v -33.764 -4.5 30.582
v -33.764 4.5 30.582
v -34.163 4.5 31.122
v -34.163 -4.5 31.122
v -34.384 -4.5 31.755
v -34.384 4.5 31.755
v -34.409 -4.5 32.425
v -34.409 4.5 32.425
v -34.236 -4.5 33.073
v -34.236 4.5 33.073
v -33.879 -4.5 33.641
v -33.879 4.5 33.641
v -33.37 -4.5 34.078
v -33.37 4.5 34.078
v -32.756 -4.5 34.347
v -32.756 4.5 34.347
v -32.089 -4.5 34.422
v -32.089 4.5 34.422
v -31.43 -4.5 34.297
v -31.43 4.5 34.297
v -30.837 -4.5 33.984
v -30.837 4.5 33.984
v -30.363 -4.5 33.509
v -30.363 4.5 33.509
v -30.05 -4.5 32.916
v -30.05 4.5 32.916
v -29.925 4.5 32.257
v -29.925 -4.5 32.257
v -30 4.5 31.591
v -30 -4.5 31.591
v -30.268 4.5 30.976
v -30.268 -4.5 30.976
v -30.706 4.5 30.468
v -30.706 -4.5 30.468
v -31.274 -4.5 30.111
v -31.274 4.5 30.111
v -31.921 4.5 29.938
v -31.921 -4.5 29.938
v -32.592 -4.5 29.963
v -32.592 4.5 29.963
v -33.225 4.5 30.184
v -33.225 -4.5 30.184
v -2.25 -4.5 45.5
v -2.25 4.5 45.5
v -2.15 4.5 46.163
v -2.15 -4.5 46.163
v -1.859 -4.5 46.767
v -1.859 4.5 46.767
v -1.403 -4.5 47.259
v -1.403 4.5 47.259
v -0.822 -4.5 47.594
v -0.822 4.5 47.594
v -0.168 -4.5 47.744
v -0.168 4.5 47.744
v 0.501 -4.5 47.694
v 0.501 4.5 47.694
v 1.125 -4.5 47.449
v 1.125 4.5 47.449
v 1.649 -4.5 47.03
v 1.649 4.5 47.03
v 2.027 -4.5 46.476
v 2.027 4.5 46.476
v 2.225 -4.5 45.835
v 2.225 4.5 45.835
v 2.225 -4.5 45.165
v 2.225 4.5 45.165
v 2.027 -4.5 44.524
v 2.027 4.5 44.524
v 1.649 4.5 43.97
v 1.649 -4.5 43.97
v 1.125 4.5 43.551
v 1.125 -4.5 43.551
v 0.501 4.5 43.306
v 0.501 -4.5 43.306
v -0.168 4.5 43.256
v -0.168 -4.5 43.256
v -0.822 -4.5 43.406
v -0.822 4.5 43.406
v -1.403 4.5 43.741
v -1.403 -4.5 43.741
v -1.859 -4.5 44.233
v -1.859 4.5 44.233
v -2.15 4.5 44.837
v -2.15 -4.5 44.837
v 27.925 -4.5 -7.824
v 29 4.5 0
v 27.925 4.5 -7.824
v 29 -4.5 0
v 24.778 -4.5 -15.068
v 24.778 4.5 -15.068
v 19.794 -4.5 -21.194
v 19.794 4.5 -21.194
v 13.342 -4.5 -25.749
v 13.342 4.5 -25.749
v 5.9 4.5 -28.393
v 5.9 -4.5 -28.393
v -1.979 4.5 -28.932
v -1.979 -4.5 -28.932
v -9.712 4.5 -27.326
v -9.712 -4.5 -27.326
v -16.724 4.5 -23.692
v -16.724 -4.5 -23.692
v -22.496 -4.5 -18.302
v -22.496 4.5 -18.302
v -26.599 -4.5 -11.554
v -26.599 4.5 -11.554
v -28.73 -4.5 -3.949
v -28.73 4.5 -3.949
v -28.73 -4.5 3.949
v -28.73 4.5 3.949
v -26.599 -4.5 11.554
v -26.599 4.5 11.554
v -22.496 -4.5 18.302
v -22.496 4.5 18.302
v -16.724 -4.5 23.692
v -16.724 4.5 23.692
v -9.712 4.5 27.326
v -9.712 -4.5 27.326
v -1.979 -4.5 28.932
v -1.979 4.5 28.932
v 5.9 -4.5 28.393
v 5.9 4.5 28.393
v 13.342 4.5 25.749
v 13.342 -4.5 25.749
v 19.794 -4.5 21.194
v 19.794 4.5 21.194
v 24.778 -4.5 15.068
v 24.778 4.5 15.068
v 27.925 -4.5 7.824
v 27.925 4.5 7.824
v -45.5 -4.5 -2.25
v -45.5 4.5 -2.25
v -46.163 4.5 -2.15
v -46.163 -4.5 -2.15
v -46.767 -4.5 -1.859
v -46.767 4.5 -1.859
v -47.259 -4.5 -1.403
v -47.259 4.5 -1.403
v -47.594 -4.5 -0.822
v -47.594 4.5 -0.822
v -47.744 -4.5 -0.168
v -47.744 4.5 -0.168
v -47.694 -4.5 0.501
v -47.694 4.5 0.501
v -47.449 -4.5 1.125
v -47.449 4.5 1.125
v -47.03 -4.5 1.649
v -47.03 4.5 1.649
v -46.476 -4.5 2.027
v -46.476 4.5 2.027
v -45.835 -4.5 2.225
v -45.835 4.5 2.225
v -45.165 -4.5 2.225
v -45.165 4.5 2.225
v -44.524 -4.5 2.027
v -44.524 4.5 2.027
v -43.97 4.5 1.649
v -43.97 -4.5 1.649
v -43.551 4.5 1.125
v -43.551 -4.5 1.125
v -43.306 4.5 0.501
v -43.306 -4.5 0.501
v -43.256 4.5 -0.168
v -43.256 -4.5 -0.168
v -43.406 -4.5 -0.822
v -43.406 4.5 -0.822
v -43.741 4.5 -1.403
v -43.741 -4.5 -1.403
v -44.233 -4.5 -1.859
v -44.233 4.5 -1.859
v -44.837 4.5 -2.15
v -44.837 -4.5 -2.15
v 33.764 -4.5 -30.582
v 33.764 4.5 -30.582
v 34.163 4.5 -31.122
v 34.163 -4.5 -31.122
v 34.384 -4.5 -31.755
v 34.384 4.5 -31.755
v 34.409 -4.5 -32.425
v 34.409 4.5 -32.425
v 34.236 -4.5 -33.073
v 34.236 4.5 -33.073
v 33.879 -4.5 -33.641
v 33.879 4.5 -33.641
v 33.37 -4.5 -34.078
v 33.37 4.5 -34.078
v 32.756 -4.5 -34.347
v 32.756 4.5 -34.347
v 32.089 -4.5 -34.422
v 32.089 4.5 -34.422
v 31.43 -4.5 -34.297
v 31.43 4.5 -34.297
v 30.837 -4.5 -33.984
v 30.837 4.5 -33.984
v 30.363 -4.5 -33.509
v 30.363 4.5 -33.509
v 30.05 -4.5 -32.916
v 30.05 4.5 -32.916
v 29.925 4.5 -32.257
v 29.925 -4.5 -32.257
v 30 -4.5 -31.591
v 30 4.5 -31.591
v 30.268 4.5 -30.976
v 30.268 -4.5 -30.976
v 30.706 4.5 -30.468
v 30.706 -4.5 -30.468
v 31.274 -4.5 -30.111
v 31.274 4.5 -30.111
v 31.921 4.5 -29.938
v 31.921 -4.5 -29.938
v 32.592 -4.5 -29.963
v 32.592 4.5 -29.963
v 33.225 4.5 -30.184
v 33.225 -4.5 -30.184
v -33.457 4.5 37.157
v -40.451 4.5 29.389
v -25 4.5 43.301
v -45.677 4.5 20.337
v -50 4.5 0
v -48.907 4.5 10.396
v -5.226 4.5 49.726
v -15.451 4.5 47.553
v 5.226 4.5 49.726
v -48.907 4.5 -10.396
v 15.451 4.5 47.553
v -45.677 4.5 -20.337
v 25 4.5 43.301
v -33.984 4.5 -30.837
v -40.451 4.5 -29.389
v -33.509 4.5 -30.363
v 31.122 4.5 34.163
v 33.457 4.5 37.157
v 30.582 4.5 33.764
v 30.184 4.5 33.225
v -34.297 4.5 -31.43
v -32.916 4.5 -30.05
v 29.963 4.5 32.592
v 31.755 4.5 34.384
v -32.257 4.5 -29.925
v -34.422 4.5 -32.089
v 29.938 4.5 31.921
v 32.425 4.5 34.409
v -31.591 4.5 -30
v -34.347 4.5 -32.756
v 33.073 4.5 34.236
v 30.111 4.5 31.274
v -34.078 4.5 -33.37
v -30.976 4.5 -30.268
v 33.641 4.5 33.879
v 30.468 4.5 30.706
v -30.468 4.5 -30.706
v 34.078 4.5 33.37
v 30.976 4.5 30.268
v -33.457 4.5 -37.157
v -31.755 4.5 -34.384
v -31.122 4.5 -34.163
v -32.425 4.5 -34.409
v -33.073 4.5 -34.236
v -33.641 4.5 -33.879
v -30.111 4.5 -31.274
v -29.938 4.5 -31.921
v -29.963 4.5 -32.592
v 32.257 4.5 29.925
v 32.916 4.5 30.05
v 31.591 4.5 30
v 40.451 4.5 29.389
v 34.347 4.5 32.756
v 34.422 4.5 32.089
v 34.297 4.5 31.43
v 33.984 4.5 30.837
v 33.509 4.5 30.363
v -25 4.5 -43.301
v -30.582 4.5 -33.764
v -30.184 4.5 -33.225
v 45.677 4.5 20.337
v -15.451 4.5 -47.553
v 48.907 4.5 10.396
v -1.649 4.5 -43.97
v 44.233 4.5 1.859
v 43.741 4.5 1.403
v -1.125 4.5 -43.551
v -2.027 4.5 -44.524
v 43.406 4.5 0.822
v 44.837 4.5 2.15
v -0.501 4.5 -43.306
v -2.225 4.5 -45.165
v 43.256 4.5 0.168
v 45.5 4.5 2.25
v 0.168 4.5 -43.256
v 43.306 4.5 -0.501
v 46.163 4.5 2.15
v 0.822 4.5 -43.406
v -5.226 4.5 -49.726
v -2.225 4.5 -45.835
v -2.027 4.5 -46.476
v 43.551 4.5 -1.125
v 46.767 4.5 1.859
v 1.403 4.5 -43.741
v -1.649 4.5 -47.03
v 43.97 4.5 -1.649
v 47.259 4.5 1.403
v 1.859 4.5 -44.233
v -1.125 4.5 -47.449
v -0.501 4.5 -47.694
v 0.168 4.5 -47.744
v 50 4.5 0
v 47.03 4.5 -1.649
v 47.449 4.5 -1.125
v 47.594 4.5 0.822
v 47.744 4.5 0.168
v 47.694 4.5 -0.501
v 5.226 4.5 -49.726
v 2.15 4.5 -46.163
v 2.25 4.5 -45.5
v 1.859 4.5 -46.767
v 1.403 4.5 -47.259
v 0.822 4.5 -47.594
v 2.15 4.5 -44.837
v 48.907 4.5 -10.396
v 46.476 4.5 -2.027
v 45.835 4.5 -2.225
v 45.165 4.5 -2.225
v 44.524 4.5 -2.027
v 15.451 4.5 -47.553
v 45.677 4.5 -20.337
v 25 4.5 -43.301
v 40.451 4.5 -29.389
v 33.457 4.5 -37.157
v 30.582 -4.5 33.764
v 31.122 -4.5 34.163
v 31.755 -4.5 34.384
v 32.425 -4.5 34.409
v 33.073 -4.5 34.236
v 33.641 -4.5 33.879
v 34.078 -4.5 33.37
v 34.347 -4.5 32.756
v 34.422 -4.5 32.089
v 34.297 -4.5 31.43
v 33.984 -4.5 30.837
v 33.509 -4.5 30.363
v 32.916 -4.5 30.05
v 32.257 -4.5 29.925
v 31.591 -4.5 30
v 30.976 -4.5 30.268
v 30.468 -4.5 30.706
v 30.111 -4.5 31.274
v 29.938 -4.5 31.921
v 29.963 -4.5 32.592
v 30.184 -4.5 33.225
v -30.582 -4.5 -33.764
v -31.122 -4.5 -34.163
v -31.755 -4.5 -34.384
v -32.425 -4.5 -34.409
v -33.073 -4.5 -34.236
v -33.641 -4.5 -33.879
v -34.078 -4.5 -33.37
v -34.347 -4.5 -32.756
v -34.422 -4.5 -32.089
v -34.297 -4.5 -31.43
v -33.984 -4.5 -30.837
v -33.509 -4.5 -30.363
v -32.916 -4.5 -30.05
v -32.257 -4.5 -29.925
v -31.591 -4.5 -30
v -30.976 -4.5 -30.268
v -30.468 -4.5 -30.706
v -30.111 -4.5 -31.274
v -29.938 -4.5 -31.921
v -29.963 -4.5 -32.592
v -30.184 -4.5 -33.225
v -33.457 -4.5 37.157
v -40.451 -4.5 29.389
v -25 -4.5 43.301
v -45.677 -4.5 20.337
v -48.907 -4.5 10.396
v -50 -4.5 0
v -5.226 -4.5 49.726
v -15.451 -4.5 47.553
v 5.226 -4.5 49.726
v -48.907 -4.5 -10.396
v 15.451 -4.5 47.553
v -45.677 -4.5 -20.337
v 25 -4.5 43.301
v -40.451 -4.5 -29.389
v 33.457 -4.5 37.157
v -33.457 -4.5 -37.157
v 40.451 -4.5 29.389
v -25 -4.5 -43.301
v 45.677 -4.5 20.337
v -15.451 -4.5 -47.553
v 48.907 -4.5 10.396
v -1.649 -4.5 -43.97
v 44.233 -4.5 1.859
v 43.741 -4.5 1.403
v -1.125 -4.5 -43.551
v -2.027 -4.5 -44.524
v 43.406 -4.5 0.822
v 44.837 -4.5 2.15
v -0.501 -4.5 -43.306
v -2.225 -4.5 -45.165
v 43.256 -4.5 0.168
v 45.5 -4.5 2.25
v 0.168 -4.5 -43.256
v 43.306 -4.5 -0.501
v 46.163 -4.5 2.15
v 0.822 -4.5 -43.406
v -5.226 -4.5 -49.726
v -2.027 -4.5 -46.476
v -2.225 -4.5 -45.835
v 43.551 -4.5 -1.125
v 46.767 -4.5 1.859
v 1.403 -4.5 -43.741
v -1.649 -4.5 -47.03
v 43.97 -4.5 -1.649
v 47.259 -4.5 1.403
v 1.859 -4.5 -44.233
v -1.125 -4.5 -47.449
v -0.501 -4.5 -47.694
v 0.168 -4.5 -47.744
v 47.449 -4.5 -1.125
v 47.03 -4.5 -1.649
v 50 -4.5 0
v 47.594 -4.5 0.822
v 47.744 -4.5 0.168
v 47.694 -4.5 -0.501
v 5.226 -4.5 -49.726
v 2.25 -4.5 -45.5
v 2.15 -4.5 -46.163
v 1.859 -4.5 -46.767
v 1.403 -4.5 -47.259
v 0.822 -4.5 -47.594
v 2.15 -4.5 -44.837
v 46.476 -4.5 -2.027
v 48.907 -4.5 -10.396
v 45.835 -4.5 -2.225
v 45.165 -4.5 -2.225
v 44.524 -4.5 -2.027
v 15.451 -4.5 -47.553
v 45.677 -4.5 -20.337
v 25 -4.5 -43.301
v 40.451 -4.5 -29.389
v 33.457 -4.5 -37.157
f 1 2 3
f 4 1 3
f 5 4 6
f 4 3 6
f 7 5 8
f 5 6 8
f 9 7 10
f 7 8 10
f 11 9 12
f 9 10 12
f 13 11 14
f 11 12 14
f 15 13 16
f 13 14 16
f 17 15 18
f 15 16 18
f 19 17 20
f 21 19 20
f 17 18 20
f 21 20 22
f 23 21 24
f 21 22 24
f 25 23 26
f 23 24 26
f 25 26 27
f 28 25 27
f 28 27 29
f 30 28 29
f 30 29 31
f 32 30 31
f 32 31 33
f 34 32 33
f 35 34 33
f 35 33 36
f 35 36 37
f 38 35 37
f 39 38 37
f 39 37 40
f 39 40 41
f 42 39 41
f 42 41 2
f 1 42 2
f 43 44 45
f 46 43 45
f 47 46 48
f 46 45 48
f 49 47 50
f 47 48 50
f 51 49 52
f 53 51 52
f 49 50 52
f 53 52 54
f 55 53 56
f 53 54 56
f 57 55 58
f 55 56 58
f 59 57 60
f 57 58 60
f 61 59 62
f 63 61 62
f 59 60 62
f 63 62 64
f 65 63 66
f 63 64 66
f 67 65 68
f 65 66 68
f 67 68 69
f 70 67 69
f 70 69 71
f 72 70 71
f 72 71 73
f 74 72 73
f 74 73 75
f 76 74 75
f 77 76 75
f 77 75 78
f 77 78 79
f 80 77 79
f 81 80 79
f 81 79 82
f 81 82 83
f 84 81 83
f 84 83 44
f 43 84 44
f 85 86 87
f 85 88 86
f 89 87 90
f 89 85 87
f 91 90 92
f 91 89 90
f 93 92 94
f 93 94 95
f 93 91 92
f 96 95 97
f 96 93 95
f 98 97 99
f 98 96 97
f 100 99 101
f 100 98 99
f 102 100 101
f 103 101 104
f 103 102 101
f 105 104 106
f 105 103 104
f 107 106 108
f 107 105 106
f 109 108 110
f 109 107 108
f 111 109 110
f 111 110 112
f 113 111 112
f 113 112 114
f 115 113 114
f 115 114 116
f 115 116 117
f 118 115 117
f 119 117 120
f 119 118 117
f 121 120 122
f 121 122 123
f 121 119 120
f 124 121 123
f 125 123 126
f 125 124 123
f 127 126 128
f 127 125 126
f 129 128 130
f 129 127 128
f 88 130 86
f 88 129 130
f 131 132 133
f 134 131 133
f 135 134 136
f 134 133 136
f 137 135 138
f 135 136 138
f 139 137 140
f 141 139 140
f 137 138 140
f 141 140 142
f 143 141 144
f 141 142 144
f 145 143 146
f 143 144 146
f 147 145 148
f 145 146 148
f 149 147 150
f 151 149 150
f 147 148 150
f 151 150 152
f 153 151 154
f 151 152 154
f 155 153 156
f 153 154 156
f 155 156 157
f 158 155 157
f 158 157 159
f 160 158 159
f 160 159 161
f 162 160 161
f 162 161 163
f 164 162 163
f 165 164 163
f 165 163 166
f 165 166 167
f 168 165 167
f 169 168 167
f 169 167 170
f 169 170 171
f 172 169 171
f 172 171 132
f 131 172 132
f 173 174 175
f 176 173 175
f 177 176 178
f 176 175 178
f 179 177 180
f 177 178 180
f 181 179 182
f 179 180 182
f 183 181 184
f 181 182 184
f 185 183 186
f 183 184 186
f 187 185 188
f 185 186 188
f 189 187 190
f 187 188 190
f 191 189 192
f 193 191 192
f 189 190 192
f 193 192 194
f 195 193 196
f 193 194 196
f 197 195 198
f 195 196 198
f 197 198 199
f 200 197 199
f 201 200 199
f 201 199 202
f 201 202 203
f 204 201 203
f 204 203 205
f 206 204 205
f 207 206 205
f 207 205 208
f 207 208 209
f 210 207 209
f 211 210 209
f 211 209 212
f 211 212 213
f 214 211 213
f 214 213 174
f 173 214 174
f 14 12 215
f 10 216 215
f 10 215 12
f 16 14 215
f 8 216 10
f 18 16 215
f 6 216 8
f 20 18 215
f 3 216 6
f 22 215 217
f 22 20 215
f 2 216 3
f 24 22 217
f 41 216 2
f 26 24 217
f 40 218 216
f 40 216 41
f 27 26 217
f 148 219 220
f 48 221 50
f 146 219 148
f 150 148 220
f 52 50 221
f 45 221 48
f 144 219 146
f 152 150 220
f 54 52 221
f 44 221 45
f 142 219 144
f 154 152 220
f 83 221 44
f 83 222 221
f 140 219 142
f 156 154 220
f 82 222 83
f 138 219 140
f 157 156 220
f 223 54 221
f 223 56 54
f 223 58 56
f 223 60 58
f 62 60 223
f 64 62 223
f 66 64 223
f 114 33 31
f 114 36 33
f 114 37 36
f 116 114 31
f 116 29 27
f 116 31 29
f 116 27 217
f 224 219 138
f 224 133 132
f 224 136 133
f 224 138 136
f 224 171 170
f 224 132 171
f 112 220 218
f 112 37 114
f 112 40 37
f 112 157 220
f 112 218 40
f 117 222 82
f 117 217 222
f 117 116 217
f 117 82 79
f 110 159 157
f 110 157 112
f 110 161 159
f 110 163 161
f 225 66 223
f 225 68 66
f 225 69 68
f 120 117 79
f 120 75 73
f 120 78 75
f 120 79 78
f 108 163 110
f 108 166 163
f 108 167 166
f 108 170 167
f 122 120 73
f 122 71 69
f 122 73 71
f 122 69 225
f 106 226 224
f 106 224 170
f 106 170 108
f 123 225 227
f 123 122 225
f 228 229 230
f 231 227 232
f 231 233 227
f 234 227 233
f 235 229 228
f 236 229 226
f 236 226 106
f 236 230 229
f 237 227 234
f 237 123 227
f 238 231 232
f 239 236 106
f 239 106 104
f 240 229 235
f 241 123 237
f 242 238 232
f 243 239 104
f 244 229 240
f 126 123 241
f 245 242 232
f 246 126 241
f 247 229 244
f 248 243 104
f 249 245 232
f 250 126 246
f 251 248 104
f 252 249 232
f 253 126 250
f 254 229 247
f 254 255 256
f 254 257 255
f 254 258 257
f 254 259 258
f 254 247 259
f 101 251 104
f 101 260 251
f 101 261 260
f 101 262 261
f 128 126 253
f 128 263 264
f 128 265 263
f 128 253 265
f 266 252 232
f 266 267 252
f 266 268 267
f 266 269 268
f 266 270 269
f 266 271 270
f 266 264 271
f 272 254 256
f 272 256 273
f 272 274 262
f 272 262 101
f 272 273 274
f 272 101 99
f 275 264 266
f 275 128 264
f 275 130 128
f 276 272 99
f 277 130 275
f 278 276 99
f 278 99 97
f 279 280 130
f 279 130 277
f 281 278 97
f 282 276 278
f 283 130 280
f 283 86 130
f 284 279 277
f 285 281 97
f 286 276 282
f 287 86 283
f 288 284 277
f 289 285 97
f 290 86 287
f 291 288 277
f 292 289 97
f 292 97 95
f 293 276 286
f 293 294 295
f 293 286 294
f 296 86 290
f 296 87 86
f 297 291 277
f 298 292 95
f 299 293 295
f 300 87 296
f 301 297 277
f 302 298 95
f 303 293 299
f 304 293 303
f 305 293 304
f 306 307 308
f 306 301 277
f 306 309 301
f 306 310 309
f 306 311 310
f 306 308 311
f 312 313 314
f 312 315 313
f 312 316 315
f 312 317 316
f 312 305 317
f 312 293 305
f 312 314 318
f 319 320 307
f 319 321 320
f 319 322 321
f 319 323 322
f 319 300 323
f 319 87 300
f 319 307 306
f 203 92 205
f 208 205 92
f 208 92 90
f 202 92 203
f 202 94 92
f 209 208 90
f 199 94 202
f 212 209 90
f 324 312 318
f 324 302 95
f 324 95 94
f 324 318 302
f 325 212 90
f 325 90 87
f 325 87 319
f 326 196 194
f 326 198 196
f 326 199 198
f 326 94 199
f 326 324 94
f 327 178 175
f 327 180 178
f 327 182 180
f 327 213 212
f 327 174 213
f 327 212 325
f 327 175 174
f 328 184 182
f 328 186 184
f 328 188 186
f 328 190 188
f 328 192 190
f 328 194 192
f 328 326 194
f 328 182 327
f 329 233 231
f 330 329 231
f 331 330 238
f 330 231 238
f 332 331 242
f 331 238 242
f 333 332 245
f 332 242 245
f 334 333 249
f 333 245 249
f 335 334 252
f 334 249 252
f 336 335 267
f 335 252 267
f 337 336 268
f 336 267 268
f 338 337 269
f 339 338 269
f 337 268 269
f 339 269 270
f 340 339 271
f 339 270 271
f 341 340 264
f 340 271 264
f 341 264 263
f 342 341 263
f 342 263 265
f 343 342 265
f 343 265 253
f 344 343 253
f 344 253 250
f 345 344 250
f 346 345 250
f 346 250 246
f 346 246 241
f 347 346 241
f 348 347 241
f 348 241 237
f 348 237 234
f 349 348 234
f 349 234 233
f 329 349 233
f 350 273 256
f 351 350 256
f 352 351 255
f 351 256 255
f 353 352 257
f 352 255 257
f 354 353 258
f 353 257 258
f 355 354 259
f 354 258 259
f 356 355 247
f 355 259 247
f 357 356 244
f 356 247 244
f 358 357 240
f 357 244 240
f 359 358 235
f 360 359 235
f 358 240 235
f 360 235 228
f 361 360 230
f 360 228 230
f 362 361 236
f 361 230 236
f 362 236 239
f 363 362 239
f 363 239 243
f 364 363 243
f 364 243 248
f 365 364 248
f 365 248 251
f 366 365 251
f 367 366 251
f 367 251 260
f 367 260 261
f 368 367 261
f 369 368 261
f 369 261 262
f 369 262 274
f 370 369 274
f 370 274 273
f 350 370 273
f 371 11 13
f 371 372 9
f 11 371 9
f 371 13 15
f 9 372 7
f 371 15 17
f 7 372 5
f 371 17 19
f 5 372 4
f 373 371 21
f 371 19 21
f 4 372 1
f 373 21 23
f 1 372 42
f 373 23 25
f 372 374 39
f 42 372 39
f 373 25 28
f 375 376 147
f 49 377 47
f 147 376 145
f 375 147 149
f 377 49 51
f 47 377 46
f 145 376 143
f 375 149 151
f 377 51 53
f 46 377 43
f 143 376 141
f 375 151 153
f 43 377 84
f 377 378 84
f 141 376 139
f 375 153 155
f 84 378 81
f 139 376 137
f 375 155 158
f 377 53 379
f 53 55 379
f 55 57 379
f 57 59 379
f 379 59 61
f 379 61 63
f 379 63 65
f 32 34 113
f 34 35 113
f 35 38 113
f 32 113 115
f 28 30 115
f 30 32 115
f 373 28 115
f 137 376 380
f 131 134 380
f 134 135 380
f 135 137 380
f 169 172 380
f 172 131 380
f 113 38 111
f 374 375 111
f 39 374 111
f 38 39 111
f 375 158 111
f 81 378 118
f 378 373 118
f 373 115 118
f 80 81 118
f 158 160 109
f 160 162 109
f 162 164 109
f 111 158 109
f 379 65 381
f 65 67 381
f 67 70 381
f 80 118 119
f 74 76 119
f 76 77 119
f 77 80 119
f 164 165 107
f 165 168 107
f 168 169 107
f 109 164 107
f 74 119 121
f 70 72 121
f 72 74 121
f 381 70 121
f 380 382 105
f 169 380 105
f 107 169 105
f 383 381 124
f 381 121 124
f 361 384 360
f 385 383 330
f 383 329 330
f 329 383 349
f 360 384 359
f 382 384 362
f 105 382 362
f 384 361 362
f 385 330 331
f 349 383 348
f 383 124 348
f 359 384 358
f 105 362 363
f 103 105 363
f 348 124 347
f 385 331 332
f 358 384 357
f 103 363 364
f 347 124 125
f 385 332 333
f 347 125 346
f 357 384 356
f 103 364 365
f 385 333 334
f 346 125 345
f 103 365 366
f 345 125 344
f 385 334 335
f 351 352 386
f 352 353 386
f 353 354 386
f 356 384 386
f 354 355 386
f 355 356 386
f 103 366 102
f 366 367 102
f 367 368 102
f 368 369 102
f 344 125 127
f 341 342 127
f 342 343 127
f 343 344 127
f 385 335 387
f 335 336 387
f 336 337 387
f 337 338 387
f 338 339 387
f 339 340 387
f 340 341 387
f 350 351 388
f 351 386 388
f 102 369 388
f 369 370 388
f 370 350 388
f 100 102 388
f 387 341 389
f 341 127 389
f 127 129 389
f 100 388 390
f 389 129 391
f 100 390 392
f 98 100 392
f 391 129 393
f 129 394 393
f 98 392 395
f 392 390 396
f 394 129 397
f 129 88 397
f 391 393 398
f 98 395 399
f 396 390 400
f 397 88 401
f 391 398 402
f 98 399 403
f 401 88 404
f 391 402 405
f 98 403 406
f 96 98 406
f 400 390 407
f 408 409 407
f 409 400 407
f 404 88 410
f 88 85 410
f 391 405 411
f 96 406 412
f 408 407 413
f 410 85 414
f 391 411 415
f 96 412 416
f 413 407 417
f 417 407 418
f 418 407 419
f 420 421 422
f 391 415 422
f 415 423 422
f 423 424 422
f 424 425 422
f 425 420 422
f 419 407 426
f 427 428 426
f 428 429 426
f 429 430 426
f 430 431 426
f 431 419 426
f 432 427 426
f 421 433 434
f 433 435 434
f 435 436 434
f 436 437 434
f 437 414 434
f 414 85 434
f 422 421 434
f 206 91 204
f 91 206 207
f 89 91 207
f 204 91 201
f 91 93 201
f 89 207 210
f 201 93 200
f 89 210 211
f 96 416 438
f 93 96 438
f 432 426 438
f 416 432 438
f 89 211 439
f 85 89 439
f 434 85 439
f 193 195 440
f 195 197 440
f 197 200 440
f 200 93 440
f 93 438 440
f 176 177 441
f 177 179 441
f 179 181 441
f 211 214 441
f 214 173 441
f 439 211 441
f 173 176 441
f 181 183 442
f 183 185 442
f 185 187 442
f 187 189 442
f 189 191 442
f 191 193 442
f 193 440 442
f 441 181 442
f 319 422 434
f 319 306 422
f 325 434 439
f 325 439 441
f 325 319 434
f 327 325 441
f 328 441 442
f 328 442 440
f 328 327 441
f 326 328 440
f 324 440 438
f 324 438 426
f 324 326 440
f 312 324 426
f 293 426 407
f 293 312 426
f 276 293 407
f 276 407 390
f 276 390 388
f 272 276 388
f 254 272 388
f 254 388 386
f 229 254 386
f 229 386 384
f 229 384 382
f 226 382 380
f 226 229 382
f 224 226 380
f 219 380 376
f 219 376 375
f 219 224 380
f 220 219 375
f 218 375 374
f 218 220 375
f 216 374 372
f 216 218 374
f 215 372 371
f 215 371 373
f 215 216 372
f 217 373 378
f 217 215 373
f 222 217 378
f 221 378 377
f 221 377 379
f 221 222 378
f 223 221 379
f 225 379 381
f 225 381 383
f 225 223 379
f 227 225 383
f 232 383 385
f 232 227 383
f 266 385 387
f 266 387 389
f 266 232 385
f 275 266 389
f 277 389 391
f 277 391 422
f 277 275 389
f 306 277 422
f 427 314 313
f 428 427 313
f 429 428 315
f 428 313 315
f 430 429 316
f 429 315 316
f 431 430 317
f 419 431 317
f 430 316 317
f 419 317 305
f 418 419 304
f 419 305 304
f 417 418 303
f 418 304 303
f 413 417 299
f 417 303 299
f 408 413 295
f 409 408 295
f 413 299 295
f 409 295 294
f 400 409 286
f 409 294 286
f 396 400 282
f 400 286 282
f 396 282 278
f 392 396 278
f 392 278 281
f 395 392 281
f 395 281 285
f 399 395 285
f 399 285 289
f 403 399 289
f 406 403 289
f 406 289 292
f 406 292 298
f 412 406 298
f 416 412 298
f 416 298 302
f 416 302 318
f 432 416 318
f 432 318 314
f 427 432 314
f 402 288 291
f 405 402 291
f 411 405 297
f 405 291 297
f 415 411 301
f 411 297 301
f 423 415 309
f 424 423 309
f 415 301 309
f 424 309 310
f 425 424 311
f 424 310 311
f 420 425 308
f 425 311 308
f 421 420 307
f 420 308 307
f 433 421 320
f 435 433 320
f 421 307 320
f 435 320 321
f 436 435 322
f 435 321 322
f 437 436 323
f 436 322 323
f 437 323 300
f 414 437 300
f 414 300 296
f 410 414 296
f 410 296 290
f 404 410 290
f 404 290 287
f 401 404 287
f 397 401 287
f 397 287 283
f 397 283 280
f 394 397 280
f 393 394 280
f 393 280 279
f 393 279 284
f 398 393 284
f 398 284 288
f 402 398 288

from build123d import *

# Parameters (mm, degrees)
SKETCH1_R           = 50
SKETCH1_R_2         = 29
BOSS_EXTRUDE1_DEPTH = 4.5
SKETCH2_R           = 2.25
CUT_EXTRUDE1_DEPTH  = 10
CIRPATTERN1_COUNT   = 8


with BuildPart() as part:
    # Sketch1 → Boss-Extrude1 (new body, symmetric)
    with BuildSketch(Plane(origin=(0, 0, 0), x_dir=(1, 0, 0), z_dir=(0, 1, 0))):
        Circle(SKETCH1_R)
        Circle(SKETCH1_R_2, mode=Mode.SUBTRACT)
    extrude(amount=BOSS_EXTRUDE1_DEPTH, both=True)

    # Sketch2 → Cut-Extrude1 (cut, through all)
    with BuildSketch(Plane(origin=(0, 4.5, 0), x_dir=(1, 0, 0), z_dir=(0, 1, 0))):
        with Locations((0, 45.5)):
            Circle(SKETCH2_R)
    cut_extrude1 = extrude(amount=-CUT_EXTRUDE1_DEPTH, mode=Mode.SUBTRACT)

    # CirPattern1: Cut-Extrude1 ×8 about axis
    cirpattern1_axis = Axis((0, 0, 0), (0, 1, 0))
    for i in range(1, CIRPATTERN1_COUNT):
        add(cut_extrude1.rotate(cirpattern1_axis, i * 360 / CIRPATTERN1_COUNT), mode=Mode.SUBTRACT)


solid = part.part
